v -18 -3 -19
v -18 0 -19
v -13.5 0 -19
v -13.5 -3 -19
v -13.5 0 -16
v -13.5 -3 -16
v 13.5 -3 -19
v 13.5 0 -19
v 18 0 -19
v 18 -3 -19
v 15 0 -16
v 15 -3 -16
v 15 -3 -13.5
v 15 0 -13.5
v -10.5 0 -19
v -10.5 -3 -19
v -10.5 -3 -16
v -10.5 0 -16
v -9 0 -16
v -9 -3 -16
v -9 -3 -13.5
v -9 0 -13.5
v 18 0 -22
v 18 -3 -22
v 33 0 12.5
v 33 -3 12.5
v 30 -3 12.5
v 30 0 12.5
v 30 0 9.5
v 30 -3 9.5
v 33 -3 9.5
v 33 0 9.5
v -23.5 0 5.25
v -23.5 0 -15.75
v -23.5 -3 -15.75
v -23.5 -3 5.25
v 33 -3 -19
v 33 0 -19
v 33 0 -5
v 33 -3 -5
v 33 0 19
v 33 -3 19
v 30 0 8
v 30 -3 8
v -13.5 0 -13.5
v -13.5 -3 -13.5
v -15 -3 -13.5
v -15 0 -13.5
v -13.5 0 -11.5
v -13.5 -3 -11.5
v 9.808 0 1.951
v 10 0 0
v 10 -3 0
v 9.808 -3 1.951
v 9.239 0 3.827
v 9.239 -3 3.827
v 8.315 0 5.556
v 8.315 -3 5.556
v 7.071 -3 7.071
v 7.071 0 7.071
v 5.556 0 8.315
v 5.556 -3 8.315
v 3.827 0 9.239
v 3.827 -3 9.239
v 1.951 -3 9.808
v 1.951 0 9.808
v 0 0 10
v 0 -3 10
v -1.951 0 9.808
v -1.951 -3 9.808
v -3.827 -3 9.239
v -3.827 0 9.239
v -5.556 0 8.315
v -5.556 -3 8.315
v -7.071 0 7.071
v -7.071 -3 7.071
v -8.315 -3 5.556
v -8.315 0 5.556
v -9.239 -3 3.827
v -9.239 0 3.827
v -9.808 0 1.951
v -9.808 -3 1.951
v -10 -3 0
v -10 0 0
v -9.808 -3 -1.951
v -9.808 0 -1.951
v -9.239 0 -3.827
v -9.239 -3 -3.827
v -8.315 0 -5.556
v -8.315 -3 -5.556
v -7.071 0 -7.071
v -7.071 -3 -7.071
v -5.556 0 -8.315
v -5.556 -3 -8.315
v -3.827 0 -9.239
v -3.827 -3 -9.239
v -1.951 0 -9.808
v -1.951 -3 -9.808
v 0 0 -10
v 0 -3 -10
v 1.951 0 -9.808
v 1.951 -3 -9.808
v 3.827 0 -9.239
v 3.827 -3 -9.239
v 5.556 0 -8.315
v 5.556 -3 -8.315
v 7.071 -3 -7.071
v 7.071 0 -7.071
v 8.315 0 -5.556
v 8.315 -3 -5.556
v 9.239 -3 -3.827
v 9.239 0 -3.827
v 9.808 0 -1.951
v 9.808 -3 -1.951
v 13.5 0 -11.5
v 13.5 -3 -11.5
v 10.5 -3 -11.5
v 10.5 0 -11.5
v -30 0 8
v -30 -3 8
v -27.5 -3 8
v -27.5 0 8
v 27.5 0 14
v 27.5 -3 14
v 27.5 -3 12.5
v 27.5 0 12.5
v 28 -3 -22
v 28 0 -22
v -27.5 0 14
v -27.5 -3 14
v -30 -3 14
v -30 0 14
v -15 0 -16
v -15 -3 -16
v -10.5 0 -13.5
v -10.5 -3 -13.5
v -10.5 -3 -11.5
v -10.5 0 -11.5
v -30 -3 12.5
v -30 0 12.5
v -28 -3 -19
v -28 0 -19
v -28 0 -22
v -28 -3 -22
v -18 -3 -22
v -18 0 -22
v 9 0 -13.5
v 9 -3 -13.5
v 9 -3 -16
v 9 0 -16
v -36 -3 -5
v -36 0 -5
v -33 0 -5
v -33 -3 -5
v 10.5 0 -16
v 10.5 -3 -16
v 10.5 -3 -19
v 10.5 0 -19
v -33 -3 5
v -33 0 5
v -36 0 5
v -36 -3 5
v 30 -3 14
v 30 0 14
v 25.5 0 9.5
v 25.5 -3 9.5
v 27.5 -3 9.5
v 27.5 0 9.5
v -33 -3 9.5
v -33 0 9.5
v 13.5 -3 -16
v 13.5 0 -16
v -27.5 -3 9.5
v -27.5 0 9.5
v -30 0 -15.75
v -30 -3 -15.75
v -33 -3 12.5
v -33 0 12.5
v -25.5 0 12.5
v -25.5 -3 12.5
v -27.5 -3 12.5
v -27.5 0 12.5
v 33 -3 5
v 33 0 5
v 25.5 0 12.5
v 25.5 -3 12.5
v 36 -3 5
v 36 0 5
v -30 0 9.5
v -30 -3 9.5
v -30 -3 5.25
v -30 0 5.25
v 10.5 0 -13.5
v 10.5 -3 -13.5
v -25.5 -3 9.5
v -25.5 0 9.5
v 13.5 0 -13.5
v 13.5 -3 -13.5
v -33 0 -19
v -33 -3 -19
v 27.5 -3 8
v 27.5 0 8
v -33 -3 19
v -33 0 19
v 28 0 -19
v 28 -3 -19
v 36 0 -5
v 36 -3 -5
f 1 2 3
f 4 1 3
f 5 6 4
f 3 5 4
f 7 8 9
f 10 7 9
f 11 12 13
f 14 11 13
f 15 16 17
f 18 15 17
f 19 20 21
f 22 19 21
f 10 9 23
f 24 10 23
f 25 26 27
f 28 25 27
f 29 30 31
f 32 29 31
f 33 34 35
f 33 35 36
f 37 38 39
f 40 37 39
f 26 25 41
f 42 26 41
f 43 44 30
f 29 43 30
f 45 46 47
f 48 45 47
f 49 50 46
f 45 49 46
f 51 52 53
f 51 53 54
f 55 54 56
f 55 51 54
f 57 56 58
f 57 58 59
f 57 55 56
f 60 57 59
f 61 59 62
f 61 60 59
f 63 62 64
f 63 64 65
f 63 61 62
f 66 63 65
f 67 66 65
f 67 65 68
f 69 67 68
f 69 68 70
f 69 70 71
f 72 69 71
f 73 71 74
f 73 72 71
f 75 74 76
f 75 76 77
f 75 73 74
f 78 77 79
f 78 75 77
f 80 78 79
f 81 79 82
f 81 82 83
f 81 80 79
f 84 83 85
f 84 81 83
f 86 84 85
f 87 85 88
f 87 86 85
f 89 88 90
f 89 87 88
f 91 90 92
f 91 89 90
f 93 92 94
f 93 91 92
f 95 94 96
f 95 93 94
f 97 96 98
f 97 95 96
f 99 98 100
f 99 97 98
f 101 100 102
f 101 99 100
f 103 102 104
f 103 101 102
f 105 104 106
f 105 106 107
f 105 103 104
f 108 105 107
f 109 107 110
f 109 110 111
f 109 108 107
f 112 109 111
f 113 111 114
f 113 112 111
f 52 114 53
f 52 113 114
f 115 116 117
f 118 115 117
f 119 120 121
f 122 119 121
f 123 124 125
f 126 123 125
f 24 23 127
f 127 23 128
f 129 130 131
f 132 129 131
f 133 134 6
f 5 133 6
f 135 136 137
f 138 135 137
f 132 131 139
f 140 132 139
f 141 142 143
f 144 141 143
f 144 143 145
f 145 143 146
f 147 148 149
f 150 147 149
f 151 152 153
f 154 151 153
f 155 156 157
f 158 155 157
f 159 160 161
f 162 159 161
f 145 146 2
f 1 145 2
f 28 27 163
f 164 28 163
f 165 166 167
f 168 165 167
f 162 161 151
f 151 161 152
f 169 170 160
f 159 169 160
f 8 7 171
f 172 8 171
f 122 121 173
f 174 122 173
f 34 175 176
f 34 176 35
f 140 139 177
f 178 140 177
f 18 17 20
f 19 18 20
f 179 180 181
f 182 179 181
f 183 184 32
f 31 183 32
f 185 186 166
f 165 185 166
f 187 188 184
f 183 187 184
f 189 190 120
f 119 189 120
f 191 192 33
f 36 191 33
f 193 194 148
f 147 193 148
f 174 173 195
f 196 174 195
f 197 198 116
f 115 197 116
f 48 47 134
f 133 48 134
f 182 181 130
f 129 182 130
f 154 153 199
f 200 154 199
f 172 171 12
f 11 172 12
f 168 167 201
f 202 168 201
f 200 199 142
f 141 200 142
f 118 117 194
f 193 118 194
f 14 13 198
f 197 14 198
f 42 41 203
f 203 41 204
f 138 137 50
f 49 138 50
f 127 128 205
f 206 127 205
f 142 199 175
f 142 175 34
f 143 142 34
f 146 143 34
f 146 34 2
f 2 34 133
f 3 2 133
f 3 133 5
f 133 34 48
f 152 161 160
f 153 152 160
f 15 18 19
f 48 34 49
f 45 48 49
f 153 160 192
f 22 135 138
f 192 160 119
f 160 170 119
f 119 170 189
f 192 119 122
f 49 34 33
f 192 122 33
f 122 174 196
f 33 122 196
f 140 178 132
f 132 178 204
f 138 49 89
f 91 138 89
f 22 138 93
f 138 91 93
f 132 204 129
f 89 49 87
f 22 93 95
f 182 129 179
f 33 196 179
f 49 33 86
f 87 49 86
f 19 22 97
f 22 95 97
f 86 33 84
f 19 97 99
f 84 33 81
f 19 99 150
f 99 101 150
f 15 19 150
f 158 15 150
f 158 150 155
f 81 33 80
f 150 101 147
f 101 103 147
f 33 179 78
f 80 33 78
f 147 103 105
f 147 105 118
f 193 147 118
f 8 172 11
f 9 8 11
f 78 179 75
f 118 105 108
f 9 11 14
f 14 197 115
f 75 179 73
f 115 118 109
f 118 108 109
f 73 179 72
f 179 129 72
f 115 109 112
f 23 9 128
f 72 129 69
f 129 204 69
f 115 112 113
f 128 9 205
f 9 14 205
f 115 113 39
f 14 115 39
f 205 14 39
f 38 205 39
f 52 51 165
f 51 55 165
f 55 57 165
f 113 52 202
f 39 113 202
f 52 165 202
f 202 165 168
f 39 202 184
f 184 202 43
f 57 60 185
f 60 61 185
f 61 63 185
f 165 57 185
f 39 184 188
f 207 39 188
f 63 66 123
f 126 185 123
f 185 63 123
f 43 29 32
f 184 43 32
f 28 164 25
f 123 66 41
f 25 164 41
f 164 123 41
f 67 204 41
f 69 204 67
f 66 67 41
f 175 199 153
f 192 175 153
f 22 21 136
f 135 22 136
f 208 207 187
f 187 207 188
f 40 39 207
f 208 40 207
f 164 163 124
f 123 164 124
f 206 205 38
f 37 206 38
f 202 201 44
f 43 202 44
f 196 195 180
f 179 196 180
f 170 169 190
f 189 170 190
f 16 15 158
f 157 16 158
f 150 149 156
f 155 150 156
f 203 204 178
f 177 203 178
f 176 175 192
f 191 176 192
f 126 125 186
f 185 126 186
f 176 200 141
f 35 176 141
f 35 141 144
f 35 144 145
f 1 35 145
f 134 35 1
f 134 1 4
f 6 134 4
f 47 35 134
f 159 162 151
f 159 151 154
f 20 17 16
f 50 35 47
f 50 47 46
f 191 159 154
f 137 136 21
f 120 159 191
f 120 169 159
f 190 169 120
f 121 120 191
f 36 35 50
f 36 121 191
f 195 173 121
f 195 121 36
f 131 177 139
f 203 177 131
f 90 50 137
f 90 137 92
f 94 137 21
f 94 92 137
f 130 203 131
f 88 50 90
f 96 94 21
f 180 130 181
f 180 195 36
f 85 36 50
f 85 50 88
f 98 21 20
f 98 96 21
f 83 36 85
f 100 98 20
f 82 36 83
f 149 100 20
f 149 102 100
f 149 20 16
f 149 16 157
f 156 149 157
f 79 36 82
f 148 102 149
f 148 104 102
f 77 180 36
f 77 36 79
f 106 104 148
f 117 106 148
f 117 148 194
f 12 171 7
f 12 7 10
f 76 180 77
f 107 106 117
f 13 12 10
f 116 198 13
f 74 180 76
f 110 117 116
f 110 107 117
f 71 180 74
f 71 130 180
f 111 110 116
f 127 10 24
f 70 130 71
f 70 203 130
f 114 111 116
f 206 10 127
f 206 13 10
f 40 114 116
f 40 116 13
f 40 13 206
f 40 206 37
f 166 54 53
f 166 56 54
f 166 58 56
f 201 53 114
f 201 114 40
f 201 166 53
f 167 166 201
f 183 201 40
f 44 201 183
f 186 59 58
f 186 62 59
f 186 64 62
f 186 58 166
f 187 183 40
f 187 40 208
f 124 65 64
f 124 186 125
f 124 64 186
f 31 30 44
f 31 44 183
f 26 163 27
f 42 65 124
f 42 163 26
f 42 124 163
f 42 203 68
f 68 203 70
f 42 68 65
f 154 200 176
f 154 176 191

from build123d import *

# Parameters (mm, degrees)
F0_W     = 6.5
F0_H     = 21
F0_R     = 10
F1_DEPTH = 3
F3_DEPTH = 3


# Not quite as in the source:
# - a feature names something its author has since deleted; it is built from what else it names


with BuildPart() as f1:
    # F0 (on Front) → F1 (new body)
    with BuildSketch(Plane.XZ):
        Polygon((33, 5), (33, 19), (-33, 19), (-33, 5), (-36, 5), (-36, -5), (-33, -5), (-33, -19), (-28, -19), (-28, -22), (-18, -22), (-18, -19), (0, -19), (18, -19), (18, -22), (28, -22), (28, -19), (33, -19), (33, -5), (36, -5), (36, 5), align=None)
        with Locations((-26.75, -5.25)):
            Rectangle(F0_W, F0_H, mode=Mode.SUBTRACT)
        Circle(F0_R, mode=Mode.SUBTRACT)
    extrude(amount=F1_DEPTH)

    # F2 (on face) → F3 (cut, through all)
    with BuildSketch(Plane.XZ.offset(3)):
        Polygon((10.5, -16), (10.5, -19), (13.5, -19), (13.5, -16), (15, -16), (15, -13.5), (13.5, -13.5), (13.5, -11.5), (10.5, -11.5), (10.5, -13.5), (9, -13.5), (9, -16), align=None)
        Polygon((30, 9.5), (33, 9.5), (33, 12.5), (30, 12.5), (30, 14), (27.5, 14), (27.5, 12.5), (25.5, 12.5), (25.5, 9.5), (27.5, 9.5), (27.5, 8), (30, 8), align=None)
        Polygon((-33, 12.5), (-33, 9.5), (-30, 9.5), (-30, 8), (-27.5, 8), (-27.5, 9.5), (-25.5, 9.5), (-25.5, 12.5), (-27.5, 12.5), (-27.5, 14), (-30, 14), (-30, 12.5), align=None)
        Polygon((-13.5, -19), (-10.5, -19), (-10.5, -16), (-9, -16), (-9, -13.5), (-10.5, -13.5), (-10.5, -11.5), (-13.5, -11.5), (-13.5, -13.5), (-15, -13.5), (-15, -16), (-13.5, -16), align=None)
    extrude(amount=-F3_DEPTH, mode=Mode.SUBTRACT)


solid = f1.part
